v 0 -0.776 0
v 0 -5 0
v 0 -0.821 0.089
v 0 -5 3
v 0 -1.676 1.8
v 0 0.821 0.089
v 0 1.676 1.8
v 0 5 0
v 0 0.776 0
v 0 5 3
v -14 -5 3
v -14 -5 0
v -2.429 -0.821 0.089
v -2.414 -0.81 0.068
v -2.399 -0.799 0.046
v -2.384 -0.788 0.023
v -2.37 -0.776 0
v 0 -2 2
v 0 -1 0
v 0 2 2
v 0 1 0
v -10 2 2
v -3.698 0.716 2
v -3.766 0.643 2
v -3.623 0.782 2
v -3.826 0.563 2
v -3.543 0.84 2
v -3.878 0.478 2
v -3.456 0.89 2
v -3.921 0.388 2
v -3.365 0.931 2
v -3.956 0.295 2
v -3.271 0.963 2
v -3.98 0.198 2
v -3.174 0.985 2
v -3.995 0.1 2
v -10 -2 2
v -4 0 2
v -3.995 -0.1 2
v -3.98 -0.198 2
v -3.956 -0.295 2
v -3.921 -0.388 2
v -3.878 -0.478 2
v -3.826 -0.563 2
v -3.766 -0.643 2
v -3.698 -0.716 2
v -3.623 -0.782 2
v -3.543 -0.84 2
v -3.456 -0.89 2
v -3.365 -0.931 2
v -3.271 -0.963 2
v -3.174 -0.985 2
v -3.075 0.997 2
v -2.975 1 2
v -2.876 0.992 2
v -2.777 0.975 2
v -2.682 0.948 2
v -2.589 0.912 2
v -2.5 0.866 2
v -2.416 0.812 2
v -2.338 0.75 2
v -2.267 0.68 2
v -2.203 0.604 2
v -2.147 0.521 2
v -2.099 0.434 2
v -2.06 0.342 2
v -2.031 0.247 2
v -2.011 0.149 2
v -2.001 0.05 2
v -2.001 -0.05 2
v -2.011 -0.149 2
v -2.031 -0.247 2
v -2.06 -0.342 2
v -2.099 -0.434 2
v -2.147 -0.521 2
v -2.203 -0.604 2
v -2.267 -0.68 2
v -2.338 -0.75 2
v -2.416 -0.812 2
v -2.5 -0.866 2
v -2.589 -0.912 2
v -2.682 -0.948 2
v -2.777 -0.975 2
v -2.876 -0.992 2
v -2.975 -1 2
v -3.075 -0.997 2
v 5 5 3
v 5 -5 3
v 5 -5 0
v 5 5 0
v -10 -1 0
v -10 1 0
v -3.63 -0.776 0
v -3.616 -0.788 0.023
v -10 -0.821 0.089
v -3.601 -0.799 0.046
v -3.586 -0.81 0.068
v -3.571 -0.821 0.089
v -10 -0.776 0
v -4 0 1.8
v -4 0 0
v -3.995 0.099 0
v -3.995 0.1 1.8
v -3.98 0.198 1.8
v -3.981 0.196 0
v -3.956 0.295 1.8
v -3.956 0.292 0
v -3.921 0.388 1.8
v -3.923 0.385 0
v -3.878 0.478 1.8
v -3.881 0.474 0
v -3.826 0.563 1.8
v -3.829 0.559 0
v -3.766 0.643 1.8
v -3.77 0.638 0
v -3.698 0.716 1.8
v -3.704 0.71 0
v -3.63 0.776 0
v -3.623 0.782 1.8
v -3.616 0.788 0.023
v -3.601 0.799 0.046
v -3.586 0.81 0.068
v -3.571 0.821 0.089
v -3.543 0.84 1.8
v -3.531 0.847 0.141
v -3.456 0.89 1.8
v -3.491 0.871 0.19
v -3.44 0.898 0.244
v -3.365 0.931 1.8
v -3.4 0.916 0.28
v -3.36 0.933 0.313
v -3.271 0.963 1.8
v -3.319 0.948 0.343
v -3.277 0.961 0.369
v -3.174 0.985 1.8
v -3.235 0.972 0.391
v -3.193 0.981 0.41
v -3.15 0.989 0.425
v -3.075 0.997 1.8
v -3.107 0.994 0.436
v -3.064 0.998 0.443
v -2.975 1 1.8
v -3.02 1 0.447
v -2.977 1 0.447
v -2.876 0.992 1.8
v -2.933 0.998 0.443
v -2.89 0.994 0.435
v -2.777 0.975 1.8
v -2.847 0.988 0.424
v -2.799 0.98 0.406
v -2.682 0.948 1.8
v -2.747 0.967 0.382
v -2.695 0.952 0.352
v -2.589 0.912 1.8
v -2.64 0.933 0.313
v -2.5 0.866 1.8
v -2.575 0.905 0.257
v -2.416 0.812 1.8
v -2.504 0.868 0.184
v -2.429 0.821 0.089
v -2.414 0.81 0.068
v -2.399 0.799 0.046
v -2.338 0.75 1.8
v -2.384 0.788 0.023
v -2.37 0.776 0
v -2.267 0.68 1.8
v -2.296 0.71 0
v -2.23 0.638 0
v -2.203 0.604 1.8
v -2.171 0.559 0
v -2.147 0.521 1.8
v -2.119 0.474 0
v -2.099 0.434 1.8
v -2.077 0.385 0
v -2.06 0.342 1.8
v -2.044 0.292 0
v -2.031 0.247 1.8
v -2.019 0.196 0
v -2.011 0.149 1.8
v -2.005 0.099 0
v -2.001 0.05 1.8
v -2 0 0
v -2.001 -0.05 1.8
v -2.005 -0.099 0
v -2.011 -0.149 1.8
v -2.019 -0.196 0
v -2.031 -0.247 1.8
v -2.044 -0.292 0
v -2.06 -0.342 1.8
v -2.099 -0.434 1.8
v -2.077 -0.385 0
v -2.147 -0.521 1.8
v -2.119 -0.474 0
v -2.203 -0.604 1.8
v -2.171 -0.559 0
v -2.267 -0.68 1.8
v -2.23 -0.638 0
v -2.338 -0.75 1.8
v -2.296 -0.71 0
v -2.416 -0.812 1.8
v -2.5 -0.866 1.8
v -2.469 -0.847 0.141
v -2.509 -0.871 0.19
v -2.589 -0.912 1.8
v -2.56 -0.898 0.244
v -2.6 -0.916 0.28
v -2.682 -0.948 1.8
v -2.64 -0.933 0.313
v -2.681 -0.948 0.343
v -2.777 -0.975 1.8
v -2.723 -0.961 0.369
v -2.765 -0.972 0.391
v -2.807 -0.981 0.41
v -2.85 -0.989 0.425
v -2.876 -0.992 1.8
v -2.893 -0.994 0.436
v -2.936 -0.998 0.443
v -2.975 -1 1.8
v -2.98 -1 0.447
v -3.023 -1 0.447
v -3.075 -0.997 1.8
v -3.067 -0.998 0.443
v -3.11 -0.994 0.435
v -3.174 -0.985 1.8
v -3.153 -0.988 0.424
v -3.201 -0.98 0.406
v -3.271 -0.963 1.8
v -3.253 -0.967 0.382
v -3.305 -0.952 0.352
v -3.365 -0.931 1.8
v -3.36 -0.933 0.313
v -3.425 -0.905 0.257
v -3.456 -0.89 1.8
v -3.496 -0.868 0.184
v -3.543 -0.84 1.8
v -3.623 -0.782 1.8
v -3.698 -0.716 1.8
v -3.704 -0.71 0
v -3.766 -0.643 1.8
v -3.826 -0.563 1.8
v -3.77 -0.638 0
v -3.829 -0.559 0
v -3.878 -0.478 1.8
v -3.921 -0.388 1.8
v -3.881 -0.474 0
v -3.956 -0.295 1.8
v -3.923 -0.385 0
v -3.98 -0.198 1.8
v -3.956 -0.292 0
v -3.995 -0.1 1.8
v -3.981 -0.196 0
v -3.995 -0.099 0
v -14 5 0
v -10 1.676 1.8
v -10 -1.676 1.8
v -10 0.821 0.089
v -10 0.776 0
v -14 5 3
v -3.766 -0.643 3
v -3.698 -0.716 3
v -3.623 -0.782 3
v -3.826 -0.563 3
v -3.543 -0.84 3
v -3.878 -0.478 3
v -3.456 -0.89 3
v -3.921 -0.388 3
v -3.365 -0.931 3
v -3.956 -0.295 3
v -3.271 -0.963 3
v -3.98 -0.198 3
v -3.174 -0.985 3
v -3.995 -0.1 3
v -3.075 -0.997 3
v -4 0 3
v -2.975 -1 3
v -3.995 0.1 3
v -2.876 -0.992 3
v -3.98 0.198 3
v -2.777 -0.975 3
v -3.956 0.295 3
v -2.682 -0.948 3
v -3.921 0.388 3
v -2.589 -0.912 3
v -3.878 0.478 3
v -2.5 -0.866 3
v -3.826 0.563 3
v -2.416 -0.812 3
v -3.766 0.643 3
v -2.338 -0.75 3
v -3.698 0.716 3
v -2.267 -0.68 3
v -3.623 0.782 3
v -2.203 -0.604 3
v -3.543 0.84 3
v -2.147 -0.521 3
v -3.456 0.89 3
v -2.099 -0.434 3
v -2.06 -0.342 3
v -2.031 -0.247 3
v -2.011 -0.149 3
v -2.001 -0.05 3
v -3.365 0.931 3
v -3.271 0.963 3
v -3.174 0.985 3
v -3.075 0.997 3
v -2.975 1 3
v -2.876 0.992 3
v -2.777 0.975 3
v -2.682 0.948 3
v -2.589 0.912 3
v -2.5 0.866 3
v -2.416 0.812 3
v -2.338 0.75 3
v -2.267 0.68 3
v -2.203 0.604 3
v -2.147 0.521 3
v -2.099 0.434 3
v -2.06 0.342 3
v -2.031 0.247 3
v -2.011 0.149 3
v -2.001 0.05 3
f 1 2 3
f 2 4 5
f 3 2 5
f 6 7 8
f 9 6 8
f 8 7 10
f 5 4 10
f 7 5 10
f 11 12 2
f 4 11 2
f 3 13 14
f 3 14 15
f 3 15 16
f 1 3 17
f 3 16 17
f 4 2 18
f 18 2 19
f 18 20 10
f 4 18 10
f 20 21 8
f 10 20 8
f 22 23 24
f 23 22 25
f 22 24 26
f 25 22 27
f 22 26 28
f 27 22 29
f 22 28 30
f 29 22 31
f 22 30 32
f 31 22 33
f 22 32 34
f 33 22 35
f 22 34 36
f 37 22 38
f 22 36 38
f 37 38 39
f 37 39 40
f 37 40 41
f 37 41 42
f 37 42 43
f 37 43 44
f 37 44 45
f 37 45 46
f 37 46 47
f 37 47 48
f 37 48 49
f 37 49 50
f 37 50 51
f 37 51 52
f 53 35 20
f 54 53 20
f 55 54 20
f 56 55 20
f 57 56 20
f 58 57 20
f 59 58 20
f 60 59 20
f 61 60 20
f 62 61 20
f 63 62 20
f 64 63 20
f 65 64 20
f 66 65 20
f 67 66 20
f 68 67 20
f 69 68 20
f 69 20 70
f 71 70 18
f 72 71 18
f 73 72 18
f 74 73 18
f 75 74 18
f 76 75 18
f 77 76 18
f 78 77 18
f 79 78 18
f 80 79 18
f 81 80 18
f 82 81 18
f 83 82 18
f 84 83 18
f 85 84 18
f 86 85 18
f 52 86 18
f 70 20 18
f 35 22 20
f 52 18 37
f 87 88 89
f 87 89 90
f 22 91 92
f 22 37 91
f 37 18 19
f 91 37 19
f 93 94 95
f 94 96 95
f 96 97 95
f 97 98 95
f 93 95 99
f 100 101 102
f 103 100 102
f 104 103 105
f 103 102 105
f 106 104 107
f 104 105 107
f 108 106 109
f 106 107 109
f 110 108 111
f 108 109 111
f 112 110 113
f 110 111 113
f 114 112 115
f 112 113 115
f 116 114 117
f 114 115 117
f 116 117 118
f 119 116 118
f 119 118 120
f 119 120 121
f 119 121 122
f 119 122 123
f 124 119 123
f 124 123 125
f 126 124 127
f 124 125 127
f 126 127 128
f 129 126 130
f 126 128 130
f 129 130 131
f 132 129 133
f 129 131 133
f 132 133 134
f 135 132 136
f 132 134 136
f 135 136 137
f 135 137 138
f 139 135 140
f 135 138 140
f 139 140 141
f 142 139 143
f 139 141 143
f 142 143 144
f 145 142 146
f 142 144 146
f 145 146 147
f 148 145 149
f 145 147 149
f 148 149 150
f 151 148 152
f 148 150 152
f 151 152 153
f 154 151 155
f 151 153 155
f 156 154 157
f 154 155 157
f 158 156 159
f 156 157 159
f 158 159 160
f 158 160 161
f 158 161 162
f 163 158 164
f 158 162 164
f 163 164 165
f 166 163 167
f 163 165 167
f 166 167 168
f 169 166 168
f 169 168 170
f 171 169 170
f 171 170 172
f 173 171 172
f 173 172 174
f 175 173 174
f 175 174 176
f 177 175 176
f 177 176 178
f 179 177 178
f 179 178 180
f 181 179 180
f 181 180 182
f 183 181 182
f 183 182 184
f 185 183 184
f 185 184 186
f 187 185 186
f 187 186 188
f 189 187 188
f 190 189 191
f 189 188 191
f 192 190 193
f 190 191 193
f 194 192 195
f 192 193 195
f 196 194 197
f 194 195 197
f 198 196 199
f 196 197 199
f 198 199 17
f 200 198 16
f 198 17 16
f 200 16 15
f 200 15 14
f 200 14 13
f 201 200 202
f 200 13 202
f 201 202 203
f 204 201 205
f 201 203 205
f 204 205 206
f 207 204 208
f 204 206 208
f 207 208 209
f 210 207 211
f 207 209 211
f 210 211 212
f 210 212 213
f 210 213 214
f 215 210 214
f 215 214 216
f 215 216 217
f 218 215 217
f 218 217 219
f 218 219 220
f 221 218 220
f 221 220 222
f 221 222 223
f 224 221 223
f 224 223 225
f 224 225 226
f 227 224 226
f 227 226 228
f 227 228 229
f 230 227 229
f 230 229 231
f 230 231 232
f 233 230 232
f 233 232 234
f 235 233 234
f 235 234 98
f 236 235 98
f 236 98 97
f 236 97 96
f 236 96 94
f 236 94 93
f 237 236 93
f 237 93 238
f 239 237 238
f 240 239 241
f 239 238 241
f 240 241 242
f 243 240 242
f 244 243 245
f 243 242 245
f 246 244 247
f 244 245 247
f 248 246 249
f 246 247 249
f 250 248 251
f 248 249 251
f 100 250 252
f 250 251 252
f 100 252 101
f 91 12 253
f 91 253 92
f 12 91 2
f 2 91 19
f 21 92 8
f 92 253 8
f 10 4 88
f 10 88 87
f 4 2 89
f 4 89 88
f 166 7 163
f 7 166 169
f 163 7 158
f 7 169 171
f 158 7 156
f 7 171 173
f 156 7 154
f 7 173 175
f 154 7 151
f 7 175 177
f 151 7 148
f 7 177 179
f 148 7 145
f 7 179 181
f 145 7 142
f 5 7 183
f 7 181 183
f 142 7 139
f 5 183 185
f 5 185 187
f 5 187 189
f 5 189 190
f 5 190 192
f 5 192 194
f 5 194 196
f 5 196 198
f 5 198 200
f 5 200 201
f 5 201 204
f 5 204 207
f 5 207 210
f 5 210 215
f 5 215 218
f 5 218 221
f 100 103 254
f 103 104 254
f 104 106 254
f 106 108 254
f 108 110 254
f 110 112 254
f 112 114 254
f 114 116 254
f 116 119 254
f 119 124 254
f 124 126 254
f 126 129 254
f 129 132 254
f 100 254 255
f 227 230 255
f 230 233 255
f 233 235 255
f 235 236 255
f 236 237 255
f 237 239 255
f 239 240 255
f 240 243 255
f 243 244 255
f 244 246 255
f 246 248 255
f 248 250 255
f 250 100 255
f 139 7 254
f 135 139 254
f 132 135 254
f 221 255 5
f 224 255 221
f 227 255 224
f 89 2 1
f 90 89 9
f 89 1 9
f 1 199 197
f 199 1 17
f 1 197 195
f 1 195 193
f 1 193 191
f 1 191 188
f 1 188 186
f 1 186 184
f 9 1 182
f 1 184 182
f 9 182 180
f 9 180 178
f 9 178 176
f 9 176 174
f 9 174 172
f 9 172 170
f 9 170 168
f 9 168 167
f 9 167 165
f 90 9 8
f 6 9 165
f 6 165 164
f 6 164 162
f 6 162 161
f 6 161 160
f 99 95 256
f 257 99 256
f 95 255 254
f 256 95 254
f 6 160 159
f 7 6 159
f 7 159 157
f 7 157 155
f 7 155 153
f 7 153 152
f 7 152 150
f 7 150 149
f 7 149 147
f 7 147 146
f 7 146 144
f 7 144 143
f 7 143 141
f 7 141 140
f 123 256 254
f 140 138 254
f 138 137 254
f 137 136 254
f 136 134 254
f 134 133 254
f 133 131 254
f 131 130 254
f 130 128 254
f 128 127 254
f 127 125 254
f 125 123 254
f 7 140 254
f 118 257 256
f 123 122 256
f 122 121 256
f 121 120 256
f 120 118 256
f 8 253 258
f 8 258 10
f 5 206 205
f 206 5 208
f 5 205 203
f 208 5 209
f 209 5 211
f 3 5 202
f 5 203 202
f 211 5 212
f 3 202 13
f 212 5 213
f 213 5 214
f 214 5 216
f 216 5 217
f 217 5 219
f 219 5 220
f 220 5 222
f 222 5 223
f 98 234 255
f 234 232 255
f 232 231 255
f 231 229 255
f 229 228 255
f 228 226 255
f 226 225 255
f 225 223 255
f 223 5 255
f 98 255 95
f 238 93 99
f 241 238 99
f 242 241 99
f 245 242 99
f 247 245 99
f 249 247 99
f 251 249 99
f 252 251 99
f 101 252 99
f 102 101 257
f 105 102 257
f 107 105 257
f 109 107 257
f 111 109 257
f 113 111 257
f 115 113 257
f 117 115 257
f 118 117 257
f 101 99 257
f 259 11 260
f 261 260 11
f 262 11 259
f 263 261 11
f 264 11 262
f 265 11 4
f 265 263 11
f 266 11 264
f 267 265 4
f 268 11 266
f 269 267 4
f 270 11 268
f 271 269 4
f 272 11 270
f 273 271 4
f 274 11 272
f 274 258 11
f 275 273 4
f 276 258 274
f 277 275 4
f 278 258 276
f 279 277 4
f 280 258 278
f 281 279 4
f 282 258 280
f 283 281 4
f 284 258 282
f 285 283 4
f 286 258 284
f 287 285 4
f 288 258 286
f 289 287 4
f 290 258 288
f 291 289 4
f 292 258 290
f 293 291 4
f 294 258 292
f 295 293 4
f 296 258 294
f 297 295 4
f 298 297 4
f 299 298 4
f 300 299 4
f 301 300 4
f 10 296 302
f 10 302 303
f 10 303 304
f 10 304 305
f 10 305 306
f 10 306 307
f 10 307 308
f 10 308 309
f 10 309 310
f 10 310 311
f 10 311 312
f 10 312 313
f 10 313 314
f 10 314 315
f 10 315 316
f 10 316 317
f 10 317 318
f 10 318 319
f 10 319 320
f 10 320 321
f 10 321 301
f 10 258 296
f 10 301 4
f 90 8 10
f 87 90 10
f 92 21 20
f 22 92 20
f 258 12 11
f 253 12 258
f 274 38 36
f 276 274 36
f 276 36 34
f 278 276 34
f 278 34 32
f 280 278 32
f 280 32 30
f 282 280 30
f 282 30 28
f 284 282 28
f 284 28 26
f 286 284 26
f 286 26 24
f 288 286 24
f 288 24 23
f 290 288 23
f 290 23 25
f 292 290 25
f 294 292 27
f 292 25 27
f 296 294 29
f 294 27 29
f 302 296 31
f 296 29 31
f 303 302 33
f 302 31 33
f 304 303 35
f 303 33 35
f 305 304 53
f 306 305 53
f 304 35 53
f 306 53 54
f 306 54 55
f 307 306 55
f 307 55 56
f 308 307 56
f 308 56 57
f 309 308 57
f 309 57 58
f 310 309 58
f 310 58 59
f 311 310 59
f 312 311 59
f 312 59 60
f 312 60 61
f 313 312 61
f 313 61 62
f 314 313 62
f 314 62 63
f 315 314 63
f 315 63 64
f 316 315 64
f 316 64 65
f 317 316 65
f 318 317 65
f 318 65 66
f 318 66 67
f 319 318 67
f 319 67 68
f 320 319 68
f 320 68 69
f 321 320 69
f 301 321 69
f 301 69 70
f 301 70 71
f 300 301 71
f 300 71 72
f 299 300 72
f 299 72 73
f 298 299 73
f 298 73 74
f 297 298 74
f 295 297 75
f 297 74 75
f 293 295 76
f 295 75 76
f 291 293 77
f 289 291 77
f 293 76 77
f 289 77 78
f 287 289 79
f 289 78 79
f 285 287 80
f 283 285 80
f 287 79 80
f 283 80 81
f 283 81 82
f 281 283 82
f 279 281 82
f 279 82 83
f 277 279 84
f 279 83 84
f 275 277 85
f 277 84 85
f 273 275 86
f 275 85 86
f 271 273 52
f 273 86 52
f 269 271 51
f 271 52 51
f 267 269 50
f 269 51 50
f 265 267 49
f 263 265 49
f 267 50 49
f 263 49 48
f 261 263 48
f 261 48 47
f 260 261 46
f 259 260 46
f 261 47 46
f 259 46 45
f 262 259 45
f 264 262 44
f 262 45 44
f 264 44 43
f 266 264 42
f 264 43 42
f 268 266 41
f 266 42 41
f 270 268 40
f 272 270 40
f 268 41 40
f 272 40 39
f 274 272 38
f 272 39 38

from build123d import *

# Parameters (mm, degrees)
F0_W     = 14
F0_H     = 10
F2_DEPTH = 3
F4_DEPTH = 10
F6_DEPTH = 10
F7_W     = 10
F7_H     = 3
F8_DEPTH = 5
F10_D    = 2
F10_2_D  = 2


with BuildPart() as f2:
    # F0 (on Top) → F2 (new body)
    with BuildSketch(Plane.XY):
        with Locations((-7, 0)):
            Rectangle(F0_W, F0_H)
    extrude(amount=F2_DEPTH)

    # F3 (on face) → F4 (cut)
    with BuildSketch(Plane.YZ):
        Polygon((-1, 0), (0, 0), (1, 0), (2, 2), (0, 2), (-2, 2), align=None)
    extrude(amount=-F4_DEPTH, mode=Mode.SUBTRACT)

    # F10 (through all)
    with Locations(Plane.XY.offset(3)):
        with Locations((-3, 0)):
            Hole(F10_D / 2)


with BuildPart() as f6:
    # F5 (on face) → F6 (new body)
    with BuildSketch(Plane.YZ.offset(-10)):
        Polygon((-1.6763932023, 1.8), (-0.8211145618, 0.0894427191), (-0.7763932023, 0), (0, 0), (0.7763932023, 0), (0.8211145618, 0.0894427191), (1.6763932023, 1.8), align=None)
    extrude(amount=F6_DEPTH)

    # F7 (on face) → F8 (join)
    with BuildSketch(Plane.YZ):
        with Locations((0, 1.5)):
            Rectangle(F7_W, F7_H)
    extrude(amount=F8_DEPTH)

    # F10#2 (through all)
    with Locations(Plane.XY.offset(3)):
        with Locations((-3, 0)):
            Hole(F10_2_D / 2)


solid = Compound([f2.part, f6.part])
